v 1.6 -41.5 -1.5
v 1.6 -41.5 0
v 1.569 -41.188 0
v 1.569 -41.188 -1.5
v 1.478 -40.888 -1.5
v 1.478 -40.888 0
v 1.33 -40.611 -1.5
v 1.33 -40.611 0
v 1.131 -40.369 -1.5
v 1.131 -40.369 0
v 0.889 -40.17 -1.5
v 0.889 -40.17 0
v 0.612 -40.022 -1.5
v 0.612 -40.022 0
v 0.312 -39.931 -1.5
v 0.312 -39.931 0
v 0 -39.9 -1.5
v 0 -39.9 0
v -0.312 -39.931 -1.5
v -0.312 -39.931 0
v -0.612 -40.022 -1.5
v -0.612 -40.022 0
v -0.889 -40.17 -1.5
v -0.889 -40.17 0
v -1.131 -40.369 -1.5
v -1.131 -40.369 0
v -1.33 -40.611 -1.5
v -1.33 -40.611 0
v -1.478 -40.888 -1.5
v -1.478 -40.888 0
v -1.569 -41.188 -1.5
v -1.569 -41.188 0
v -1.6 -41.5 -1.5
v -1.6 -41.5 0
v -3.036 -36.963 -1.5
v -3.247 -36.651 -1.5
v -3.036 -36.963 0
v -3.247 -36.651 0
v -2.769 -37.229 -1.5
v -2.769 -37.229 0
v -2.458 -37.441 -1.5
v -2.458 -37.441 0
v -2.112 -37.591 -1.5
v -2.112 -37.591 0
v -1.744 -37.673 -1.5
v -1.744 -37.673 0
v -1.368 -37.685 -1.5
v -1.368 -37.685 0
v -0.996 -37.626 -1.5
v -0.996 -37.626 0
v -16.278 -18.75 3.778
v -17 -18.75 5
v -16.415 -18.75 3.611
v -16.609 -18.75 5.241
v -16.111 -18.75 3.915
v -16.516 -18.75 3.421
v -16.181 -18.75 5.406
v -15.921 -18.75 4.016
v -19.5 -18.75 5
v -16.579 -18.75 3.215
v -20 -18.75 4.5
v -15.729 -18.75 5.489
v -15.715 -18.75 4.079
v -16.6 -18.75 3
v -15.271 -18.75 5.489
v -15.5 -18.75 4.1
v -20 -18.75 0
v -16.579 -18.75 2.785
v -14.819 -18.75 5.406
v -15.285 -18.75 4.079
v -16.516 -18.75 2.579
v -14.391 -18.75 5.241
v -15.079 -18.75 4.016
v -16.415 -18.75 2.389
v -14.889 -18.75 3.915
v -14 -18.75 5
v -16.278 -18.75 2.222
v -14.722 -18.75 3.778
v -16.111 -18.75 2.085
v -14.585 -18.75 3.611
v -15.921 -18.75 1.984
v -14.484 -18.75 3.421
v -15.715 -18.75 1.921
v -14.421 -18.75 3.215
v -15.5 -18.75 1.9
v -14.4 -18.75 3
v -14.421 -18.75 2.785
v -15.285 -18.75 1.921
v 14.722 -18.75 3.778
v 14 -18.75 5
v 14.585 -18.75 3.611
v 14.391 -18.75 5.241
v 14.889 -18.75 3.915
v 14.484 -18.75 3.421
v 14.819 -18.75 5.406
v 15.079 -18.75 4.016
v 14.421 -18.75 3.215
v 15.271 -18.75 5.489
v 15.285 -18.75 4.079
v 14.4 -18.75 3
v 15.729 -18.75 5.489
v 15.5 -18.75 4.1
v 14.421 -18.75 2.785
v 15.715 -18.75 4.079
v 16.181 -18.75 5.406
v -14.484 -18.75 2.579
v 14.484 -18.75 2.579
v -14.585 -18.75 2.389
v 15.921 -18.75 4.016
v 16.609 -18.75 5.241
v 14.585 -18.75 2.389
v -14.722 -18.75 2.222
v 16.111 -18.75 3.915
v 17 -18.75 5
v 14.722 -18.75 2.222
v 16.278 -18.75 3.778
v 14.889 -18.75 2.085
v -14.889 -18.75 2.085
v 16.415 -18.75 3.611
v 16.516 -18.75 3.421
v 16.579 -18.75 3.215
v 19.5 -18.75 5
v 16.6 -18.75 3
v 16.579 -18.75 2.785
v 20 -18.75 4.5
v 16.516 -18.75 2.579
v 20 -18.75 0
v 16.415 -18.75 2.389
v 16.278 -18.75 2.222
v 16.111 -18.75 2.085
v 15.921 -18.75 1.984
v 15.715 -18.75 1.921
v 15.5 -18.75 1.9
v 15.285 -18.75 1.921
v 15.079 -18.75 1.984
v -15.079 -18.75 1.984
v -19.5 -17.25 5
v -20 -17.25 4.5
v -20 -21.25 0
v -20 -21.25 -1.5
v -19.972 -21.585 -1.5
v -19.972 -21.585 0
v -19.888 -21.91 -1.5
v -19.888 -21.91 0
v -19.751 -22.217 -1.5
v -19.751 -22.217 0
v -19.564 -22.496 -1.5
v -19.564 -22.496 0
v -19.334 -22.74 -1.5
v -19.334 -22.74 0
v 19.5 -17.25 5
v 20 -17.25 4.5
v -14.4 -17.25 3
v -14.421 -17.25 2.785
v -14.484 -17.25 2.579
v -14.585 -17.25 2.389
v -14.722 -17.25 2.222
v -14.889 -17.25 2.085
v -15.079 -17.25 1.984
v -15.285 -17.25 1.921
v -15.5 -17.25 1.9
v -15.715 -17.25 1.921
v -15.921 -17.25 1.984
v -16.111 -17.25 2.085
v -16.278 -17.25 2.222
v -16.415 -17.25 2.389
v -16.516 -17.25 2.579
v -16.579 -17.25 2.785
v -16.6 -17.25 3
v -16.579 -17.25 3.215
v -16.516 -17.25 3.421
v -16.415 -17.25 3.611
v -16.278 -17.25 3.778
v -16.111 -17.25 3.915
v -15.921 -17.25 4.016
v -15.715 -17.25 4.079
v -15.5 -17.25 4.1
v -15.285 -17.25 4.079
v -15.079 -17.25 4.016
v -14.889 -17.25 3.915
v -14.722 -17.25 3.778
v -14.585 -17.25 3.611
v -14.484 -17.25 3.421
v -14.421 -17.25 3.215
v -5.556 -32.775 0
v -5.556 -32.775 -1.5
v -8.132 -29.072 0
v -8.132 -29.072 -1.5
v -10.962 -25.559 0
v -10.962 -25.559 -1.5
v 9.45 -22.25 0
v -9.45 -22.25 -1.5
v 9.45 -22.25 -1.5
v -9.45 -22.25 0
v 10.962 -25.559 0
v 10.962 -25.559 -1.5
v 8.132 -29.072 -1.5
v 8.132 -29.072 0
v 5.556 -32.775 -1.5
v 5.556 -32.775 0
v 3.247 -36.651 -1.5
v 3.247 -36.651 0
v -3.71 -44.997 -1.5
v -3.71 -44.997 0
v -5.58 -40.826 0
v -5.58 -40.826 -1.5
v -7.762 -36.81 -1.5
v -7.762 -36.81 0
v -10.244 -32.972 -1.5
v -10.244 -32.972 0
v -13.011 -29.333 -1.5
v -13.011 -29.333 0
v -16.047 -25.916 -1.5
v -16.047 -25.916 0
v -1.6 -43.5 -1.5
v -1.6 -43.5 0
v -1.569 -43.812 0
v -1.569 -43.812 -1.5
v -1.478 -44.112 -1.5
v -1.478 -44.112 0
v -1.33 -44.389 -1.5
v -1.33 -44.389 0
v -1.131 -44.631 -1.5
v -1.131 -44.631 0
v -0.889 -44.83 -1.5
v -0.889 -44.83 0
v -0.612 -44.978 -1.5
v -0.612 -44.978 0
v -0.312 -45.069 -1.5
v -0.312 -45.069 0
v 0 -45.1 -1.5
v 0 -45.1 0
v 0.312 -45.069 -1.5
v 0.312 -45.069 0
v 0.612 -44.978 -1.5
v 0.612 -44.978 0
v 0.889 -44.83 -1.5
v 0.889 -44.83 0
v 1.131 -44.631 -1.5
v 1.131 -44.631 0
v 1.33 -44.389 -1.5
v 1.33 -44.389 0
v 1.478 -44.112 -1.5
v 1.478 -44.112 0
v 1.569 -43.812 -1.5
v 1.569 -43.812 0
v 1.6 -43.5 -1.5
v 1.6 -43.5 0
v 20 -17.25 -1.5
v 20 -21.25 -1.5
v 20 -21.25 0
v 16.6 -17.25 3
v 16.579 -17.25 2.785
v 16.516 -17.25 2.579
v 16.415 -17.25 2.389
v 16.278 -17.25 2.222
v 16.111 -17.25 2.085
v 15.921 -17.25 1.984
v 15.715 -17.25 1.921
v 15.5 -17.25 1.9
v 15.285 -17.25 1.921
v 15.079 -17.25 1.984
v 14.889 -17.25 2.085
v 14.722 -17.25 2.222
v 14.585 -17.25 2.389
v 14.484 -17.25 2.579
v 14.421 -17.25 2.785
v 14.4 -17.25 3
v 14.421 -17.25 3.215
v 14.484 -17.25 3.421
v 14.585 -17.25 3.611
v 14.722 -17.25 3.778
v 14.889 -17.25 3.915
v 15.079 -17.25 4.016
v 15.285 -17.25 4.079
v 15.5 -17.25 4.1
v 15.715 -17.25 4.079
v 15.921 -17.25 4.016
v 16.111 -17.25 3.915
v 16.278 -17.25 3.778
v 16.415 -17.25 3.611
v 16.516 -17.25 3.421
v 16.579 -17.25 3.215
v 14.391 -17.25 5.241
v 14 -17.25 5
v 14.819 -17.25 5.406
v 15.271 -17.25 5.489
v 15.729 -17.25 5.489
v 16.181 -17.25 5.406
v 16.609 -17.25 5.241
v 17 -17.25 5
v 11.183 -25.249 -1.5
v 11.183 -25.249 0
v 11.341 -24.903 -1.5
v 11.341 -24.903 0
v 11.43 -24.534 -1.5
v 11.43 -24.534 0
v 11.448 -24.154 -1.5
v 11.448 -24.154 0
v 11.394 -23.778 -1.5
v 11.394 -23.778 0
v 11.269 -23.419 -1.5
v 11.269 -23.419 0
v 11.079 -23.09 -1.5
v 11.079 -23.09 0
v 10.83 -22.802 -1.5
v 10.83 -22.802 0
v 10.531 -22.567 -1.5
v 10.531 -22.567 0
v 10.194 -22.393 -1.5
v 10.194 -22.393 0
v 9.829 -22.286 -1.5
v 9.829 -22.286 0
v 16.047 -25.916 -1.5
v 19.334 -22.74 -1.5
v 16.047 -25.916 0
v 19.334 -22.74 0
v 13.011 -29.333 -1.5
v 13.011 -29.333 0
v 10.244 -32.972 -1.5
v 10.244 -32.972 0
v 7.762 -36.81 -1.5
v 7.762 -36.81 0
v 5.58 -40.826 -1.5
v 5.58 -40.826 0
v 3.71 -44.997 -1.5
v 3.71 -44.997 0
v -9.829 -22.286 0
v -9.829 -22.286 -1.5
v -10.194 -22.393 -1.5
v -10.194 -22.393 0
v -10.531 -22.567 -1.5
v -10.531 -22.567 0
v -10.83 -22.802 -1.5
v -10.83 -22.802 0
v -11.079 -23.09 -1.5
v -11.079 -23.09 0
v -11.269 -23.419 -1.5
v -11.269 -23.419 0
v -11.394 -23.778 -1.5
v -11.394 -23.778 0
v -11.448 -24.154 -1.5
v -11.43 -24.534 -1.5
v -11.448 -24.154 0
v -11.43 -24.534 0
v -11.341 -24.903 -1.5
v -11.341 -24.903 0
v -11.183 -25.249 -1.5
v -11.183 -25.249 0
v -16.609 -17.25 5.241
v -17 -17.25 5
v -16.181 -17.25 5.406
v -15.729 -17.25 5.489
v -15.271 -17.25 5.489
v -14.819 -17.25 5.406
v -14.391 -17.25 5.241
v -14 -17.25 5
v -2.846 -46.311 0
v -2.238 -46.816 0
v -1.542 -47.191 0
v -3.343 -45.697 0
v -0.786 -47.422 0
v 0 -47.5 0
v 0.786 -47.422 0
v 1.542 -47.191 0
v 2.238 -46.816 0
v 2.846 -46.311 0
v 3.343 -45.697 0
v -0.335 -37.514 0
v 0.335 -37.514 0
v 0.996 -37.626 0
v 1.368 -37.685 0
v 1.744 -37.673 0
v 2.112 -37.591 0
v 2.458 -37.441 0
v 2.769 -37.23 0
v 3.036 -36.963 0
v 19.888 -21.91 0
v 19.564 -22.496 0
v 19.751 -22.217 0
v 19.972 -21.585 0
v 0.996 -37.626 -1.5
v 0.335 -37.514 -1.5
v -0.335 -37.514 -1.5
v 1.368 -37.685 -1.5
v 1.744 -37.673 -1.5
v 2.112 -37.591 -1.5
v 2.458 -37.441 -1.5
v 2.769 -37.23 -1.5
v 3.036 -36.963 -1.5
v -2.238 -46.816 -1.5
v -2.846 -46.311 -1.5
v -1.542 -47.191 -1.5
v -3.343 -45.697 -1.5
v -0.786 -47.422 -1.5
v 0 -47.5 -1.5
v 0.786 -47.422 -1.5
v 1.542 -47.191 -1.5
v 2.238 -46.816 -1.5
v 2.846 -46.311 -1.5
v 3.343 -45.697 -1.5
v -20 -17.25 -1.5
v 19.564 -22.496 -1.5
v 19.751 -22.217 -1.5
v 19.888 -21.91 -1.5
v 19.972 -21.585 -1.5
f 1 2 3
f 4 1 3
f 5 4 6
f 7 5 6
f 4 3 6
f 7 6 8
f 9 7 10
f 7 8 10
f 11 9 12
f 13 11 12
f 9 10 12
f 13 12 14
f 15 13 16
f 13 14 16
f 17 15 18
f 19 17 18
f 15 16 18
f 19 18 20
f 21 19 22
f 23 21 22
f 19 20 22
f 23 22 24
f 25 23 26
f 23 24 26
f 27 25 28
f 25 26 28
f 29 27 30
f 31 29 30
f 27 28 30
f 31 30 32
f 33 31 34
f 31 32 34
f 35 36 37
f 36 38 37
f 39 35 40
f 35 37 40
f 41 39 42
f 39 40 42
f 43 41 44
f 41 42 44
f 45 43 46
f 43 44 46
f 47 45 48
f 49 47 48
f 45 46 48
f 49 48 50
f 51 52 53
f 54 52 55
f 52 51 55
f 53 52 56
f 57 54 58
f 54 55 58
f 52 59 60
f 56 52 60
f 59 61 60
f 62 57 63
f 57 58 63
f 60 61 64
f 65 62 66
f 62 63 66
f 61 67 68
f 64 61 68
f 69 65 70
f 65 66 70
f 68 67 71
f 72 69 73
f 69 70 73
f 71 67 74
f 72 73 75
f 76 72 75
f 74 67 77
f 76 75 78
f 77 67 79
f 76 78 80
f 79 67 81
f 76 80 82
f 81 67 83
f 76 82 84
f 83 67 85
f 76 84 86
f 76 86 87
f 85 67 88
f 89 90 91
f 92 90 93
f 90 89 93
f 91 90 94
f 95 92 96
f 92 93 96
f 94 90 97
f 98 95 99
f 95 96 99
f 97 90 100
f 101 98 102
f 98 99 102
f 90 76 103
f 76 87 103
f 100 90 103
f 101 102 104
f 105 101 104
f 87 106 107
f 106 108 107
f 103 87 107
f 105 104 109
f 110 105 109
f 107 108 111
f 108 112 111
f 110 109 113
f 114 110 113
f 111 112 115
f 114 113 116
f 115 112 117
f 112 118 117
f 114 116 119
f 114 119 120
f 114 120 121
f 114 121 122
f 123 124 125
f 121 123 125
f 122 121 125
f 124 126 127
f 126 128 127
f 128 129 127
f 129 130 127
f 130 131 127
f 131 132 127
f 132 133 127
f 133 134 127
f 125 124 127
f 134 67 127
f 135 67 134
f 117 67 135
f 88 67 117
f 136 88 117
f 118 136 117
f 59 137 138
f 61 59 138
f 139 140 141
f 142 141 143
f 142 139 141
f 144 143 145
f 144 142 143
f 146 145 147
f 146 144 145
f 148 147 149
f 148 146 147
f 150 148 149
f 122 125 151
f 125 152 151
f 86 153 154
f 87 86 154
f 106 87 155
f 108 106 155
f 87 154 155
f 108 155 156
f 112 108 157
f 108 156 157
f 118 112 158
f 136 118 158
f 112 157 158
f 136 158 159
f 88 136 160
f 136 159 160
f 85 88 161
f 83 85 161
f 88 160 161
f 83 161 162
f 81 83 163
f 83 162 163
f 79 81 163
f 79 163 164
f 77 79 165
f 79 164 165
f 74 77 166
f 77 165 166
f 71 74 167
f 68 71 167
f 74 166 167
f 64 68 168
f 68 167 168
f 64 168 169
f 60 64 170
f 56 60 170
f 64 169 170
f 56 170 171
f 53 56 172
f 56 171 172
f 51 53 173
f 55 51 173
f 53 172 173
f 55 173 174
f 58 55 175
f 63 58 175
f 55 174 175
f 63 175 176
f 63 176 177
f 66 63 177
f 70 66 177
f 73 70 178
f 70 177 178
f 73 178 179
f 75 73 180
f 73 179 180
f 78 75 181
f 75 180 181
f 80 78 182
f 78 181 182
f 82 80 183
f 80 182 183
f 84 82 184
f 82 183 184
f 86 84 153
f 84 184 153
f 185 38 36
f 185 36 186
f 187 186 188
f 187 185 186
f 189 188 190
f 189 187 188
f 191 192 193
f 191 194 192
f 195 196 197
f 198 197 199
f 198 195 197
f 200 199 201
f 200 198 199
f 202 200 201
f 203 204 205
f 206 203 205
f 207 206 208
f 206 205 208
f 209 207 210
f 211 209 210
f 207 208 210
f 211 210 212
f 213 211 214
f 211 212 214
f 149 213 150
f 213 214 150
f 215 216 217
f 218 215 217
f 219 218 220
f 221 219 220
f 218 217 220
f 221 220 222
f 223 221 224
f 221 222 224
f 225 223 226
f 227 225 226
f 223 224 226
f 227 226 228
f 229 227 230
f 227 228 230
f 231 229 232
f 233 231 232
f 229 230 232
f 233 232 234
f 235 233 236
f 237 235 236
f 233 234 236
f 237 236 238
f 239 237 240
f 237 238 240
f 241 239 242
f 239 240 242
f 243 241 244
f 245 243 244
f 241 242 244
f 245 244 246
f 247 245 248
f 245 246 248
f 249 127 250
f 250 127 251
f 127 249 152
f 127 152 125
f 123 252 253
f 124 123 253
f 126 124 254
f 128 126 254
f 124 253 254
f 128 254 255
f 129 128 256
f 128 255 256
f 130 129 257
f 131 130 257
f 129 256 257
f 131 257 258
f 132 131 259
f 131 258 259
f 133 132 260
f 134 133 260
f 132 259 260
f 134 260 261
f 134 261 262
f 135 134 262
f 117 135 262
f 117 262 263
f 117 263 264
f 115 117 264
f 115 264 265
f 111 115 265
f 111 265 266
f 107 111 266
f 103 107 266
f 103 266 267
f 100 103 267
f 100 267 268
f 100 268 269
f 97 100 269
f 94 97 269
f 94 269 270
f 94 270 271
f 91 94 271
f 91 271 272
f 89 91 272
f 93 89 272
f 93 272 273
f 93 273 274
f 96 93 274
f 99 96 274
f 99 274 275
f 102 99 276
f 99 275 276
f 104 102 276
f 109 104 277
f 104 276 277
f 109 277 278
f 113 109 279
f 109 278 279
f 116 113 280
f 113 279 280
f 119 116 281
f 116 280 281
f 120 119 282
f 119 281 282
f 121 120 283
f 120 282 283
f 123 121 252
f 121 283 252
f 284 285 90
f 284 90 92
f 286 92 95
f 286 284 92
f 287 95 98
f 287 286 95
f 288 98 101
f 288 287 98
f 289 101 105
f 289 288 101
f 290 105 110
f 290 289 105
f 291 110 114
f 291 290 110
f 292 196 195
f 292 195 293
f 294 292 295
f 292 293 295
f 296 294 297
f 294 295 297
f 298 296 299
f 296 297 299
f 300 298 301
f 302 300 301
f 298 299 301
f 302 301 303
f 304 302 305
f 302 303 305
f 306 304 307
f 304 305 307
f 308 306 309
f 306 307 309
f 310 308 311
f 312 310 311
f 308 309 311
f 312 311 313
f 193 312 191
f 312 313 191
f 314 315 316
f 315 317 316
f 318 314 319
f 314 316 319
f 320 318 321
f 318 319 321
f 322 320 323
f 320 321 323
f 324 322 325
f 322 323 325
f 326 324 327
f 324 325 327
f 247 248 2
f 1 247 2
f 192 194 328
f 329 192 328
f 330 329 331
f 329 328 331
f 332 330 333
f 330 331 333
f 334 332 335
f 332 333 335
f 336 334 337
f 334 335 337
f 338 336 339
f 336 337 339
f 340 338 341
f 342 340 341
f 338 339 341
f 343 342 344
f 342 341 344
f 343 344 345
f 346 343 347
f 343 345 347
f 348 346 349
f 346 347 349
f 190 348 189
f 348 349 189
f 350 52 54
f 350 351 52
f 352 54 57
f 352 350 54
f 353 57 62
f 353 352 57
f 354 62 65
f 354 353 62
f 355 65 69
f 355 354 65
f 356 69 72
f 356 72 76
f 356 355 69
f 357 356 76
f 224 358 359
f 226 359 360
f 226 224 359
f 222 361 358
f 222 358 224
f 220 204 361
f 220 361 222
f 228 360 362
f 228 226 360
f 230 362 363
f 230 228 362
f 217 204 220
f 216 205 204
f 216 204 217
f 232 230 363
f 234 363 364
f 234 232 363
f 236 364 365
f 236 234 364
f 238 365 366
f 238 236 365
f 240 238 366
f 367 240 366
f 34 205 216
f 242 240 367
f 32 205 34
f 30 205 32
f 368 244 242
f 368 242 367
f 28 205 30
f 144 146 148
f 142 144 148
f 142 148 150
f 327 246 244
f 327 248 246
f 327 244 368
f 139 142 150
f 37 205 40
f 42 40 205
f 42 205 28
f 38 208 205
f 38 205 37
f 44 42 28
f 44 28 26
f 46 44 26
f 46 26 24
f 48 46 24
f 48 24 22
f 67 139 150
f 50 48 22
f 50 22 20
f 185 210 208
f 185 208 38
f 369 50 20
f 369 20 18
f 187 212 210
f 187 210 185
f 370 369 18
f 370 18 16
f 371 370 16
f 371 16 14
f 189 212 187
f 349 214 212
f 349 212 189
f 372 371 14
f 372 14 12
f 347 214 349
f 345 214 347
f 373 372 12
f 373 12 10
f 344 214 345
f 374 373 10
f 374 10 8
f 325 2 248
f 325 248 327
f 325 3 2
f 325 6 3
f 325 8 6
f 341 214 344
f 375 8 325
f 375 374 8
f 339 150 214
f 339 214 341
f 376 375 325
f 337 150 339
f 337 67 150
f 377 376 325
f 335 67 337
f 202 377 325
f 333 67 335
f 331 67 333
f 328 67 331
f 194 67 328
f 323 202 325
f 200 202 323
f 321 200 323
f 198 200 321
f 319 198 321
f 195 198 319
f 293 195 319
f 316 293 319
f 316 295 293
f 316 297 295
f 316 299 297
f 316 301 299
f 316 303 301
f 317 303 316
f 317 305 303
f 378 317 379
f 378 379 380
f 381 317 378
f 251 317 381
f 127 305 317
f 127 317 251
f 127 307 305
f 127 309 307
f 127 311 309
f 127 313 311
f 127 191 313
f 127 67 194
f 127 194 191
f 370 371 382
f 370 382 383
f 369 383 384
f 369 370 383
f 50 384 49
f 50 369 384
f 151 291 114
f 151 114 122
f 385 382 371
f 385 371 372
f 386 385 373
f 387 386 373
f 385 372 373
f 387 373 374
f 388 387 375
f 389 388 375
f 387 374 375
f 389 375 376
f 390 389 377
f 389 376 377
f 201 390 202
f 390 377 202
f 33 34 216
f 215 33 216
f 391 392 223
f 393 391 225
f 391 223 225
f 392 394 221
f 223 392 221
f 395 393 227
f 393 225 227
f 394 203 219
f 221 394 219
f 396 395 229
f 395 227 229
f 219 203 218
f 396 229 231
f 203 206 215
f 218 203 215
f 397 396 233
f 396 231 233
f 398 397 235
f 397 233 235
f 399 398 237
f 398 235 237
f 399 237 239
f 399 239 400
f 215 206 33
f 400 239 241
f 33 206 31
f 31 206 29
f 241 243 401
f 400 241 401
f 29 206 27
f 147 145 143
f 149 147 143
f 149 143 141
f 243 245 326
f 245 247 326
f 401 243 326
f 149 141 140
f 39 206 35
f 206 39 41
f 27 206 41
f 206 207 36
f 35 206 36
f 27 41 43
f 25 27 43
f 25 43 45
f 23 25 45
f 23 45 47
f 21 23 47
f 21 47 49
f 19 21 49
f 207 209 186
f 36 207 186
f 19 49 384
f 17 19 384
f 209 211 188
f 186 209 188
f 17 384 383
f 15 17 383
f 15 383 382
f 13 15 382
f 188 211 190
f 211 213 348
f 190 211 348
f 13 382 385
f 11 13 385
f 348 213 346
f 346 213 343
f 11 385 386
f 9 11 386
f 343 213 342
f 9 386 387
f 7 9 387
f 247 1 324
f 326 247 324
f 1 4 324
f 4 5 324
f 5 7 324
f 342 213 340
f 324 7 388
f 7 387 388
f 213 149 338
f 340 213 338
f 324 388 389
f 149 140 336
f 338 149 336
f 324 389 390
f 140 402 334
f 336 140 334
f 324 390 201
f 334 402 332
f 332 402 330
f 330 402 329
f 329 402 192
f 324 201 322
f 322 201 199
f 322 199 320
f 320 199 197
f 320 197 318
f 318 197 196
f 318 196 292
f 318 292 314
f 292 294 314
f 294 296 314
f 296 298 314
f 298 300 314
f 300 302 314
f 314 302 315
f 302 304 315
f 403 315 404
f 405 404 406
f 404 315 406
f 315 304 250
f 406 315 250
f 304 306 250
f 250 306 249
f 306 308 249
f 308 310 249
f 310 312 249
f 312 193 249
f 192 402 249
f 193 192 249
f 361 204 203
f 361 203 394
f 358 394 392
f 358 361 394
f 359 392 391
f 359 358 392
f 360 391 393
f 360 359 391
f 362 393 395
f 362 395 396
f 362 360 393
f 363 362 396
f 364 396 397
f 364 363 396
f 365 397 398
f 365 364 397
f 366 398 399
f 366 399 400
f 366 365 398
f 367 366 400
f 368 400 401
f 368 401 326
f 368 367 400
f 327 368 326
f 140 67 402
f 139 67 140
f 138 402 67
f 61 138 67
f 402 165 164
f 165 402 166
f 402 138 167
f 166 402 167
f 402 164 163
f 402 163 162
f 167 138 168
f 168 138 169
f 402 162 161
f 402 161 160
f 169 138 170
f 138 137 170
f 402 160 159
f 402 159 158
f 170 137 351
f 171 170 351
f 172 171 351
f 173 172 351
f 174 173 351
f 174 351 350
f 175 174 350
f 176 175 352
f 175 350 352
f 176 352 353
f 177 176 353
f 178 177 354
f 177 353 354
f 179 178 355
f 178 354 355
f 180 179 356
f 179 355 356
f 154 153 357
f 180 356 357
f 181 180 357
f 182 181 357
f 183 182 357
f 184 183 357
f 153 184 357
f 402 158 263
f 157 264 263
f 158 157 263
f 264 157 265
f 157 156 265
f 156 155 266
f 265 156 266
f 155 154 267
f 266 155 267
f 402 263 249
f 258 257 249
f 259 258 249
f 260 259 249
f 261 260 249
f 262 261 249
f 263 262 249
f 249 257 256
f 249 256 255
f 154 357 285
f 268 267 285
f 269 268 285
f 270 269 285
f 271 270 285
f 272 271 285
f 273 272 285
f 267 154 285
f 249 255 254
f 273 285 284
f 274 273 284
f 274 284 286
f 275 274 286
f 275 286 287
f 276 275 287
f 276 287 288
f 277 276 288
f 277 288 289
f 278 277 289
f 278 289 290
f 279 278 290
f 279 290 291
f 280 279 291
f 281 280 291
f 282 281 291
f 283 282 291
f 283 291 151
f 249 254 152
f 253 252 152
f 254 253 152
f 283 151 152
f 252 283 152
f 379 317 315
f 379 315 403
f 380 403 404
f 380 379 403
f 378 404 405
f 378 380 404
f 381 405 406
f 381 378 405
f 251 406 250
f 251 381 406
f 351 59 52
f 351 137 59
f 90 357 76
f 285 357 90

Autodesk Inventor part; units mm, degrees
ref_plane "YZ Plane" through (0, 0, 0) normal (1, 0, 0) x (0, 1, 0)
ref_plane "XZ Plane" through (0, 0, 0) normal (0, 1, 0) x (-1, 0, 0)
ref_plane "XY Plane" through (0, 0, 0) normal (0, 0, 1) x (1, 0, 0)
sketch "スケッチ1" plane through (0, 0, 0) normal (0, 0, 1) x (1, 0, 0)
  line L0 (-59, -17.25) -> (53, -17.25) construction
  line L1 (1.6, -41.5) -> (-1.6, -41.5) construction
  line L2 (-1.6, -41.5) -> (-1.6, -43.5)
  line L3 (-1.6, -43.5) -> (1.6, -43.5) construction
  line L4 (1.6, -43.5) -> (1.6, -41.5)
  arc A0 (1.6, -41.5) -> (-1.6, -41.5) centre (0, -41.5) ccw
  arc A1 (-1.6, -43.5) -> (1.6, -43.5) centre (0, -43.5) ccw
  circle A2 centre (0, -42.5) radius 1.5 construction
  line L5 (0, -41.5) -> (0, -42.5) construction
  line L6 (0, -42.5) -> (0, -43.5) construction
  line L7 (0, -41.5) -> (0, -17.25) construction
  line L8 (0, -17.25) -> (-20, -17.25)
  line L9 (-20, -17.25) -> (-20, -21.25)
  line L10 (0, -17.25) -> (20, -17.25)
  line L11 (20, -17.25) -> (20, -21.25)
  arc A3 (-3.7095, -44.9966) -> (3.7095, -44.9966) centre (0, -43.5) ccw
  arc A4 (-3.7095, -44.9966) -> (-19.3339, -22.7402) centre (-59.3515, -67.4458) ccw
  arc A5 (19.3339, -22.7402) -> (3.7095, -44.9966) centre (59.3515, -67.4458) ccw
  arc A6 (-20, -21.25) -> (-19.3339, -22.7402) centre (-18, -21.25) ccw
  arc A7 (19.3339, -22.7402) -> (20, -21.25) centre (18, -21.25) ccw
  arc A8 (-3.2471, -36.6513) -> (-10.9625, -25.559) centre (-59.3515, -67.4458) ccw
  arc A9 (10.9625, -25.559) -> (3.2471, -36.6513) centre (59.3515, -67.4458) ccw
  arc A10 (0.9959, -37.626) -> (-0.9959, -37.626) centre (0, -41.5) ccw
  line L12 (-9.4504, -22.25) -> (9.4504, -22.25)
  arc A11 (-9.4504, -22.25) -> (-10.9625, -25.559) centre (-9.4504, -24.25) ccw
  arc A12 (10.9625, -25.559) -> (9.4504, -22.25) centre (9.4504, -24.25) ccw
  arc A13 (0.9959, -37.626) -> (3.2471, -36.6513) centre (1.4939, -35.6889) ccw
  arc A14 (-3.2471, -36.6513) -> (-0.9959, -37.626) centre (-1.4939, -35.6889) ccw
  point P0 (0, 0)
  point P1 (-20, -22.1528)
  point P2 (20, -22.1528)
  dimension "d0" = 2
  dimension "d1" = 1.6
  dimension "d3" = 4
  dimension "d4" = 2
  dimension "d5" = 4
  dimension "d6" = 60
  dimension "d7" = 20
  dimension "d8" = 4
  dimension "d9" = 4
  dimension "d10" = 2.4
  dimension "d11" = 5
  dimension "d12" = 2
extrude "押し出し1" add sketch "スケッチ1" against normal blind 1.5
sketch "スケッチ2" plane through (-20, -17.25, 0) normal (0, 1, 0) x (1, 0, 0)
  line L0 (40, 0) -> (0, 0) construction
  line L1 (40, 0) -> (0, 0)
  line L2 (0, 0) -> (0, -4.5)
  line L3 (0.5, -5) -> (3, -5)
  line L4 (40, -4.5) -> (40, 0)
  line L5 (0, 0) -> (0, 1.5) construction
  line L6 (69.5, -5) -> (-3.5, -5) construction
  line L7 (20, 0) -> (20, -8.2375) construction
  circle A0 centre (35.5, -3) radius 1.1
  line L8 (40, -4.5) -> (39.5, -5)
  line L9 (0.5, -5) -> (0, -4.5)
  arc A1 (34, -5) -> (37, -5) centre (35.5, -3) ccw
  line L10 (37, -5) -> (39.5, -5)
  line L11 (34, -5) -> (37, -5) construction
  circle A2 centre (4.5, -3) radius 1.1
  arc A3 (3, -5) -> (6, -5) centre (4.5, -3) ccw
  line L12 (6, -5) -> (34, -5)
  line L13 (3, -5) -> (6, -5) construction
  point P0 (40, -5)
  point P1 (0, -5)
  dimension "d18" = 2.2
  dimension "d19" = 0.5
  dimension "d20" = 0.5
  dimension "d21" = 0.5
  dimension "d22" = 0.5
  dimension "d23" = 2.5
  dimension "d24" = 4.5
  dimension "d25" = 2
extrude "押し出し2" add sketch "スケッチ2" against normal blind 1.5
equation "\"d20\" = d19"
equation "\"d21\" = d19"
equation "\"d22\" = d21"
properties part number "NUC_tab"
